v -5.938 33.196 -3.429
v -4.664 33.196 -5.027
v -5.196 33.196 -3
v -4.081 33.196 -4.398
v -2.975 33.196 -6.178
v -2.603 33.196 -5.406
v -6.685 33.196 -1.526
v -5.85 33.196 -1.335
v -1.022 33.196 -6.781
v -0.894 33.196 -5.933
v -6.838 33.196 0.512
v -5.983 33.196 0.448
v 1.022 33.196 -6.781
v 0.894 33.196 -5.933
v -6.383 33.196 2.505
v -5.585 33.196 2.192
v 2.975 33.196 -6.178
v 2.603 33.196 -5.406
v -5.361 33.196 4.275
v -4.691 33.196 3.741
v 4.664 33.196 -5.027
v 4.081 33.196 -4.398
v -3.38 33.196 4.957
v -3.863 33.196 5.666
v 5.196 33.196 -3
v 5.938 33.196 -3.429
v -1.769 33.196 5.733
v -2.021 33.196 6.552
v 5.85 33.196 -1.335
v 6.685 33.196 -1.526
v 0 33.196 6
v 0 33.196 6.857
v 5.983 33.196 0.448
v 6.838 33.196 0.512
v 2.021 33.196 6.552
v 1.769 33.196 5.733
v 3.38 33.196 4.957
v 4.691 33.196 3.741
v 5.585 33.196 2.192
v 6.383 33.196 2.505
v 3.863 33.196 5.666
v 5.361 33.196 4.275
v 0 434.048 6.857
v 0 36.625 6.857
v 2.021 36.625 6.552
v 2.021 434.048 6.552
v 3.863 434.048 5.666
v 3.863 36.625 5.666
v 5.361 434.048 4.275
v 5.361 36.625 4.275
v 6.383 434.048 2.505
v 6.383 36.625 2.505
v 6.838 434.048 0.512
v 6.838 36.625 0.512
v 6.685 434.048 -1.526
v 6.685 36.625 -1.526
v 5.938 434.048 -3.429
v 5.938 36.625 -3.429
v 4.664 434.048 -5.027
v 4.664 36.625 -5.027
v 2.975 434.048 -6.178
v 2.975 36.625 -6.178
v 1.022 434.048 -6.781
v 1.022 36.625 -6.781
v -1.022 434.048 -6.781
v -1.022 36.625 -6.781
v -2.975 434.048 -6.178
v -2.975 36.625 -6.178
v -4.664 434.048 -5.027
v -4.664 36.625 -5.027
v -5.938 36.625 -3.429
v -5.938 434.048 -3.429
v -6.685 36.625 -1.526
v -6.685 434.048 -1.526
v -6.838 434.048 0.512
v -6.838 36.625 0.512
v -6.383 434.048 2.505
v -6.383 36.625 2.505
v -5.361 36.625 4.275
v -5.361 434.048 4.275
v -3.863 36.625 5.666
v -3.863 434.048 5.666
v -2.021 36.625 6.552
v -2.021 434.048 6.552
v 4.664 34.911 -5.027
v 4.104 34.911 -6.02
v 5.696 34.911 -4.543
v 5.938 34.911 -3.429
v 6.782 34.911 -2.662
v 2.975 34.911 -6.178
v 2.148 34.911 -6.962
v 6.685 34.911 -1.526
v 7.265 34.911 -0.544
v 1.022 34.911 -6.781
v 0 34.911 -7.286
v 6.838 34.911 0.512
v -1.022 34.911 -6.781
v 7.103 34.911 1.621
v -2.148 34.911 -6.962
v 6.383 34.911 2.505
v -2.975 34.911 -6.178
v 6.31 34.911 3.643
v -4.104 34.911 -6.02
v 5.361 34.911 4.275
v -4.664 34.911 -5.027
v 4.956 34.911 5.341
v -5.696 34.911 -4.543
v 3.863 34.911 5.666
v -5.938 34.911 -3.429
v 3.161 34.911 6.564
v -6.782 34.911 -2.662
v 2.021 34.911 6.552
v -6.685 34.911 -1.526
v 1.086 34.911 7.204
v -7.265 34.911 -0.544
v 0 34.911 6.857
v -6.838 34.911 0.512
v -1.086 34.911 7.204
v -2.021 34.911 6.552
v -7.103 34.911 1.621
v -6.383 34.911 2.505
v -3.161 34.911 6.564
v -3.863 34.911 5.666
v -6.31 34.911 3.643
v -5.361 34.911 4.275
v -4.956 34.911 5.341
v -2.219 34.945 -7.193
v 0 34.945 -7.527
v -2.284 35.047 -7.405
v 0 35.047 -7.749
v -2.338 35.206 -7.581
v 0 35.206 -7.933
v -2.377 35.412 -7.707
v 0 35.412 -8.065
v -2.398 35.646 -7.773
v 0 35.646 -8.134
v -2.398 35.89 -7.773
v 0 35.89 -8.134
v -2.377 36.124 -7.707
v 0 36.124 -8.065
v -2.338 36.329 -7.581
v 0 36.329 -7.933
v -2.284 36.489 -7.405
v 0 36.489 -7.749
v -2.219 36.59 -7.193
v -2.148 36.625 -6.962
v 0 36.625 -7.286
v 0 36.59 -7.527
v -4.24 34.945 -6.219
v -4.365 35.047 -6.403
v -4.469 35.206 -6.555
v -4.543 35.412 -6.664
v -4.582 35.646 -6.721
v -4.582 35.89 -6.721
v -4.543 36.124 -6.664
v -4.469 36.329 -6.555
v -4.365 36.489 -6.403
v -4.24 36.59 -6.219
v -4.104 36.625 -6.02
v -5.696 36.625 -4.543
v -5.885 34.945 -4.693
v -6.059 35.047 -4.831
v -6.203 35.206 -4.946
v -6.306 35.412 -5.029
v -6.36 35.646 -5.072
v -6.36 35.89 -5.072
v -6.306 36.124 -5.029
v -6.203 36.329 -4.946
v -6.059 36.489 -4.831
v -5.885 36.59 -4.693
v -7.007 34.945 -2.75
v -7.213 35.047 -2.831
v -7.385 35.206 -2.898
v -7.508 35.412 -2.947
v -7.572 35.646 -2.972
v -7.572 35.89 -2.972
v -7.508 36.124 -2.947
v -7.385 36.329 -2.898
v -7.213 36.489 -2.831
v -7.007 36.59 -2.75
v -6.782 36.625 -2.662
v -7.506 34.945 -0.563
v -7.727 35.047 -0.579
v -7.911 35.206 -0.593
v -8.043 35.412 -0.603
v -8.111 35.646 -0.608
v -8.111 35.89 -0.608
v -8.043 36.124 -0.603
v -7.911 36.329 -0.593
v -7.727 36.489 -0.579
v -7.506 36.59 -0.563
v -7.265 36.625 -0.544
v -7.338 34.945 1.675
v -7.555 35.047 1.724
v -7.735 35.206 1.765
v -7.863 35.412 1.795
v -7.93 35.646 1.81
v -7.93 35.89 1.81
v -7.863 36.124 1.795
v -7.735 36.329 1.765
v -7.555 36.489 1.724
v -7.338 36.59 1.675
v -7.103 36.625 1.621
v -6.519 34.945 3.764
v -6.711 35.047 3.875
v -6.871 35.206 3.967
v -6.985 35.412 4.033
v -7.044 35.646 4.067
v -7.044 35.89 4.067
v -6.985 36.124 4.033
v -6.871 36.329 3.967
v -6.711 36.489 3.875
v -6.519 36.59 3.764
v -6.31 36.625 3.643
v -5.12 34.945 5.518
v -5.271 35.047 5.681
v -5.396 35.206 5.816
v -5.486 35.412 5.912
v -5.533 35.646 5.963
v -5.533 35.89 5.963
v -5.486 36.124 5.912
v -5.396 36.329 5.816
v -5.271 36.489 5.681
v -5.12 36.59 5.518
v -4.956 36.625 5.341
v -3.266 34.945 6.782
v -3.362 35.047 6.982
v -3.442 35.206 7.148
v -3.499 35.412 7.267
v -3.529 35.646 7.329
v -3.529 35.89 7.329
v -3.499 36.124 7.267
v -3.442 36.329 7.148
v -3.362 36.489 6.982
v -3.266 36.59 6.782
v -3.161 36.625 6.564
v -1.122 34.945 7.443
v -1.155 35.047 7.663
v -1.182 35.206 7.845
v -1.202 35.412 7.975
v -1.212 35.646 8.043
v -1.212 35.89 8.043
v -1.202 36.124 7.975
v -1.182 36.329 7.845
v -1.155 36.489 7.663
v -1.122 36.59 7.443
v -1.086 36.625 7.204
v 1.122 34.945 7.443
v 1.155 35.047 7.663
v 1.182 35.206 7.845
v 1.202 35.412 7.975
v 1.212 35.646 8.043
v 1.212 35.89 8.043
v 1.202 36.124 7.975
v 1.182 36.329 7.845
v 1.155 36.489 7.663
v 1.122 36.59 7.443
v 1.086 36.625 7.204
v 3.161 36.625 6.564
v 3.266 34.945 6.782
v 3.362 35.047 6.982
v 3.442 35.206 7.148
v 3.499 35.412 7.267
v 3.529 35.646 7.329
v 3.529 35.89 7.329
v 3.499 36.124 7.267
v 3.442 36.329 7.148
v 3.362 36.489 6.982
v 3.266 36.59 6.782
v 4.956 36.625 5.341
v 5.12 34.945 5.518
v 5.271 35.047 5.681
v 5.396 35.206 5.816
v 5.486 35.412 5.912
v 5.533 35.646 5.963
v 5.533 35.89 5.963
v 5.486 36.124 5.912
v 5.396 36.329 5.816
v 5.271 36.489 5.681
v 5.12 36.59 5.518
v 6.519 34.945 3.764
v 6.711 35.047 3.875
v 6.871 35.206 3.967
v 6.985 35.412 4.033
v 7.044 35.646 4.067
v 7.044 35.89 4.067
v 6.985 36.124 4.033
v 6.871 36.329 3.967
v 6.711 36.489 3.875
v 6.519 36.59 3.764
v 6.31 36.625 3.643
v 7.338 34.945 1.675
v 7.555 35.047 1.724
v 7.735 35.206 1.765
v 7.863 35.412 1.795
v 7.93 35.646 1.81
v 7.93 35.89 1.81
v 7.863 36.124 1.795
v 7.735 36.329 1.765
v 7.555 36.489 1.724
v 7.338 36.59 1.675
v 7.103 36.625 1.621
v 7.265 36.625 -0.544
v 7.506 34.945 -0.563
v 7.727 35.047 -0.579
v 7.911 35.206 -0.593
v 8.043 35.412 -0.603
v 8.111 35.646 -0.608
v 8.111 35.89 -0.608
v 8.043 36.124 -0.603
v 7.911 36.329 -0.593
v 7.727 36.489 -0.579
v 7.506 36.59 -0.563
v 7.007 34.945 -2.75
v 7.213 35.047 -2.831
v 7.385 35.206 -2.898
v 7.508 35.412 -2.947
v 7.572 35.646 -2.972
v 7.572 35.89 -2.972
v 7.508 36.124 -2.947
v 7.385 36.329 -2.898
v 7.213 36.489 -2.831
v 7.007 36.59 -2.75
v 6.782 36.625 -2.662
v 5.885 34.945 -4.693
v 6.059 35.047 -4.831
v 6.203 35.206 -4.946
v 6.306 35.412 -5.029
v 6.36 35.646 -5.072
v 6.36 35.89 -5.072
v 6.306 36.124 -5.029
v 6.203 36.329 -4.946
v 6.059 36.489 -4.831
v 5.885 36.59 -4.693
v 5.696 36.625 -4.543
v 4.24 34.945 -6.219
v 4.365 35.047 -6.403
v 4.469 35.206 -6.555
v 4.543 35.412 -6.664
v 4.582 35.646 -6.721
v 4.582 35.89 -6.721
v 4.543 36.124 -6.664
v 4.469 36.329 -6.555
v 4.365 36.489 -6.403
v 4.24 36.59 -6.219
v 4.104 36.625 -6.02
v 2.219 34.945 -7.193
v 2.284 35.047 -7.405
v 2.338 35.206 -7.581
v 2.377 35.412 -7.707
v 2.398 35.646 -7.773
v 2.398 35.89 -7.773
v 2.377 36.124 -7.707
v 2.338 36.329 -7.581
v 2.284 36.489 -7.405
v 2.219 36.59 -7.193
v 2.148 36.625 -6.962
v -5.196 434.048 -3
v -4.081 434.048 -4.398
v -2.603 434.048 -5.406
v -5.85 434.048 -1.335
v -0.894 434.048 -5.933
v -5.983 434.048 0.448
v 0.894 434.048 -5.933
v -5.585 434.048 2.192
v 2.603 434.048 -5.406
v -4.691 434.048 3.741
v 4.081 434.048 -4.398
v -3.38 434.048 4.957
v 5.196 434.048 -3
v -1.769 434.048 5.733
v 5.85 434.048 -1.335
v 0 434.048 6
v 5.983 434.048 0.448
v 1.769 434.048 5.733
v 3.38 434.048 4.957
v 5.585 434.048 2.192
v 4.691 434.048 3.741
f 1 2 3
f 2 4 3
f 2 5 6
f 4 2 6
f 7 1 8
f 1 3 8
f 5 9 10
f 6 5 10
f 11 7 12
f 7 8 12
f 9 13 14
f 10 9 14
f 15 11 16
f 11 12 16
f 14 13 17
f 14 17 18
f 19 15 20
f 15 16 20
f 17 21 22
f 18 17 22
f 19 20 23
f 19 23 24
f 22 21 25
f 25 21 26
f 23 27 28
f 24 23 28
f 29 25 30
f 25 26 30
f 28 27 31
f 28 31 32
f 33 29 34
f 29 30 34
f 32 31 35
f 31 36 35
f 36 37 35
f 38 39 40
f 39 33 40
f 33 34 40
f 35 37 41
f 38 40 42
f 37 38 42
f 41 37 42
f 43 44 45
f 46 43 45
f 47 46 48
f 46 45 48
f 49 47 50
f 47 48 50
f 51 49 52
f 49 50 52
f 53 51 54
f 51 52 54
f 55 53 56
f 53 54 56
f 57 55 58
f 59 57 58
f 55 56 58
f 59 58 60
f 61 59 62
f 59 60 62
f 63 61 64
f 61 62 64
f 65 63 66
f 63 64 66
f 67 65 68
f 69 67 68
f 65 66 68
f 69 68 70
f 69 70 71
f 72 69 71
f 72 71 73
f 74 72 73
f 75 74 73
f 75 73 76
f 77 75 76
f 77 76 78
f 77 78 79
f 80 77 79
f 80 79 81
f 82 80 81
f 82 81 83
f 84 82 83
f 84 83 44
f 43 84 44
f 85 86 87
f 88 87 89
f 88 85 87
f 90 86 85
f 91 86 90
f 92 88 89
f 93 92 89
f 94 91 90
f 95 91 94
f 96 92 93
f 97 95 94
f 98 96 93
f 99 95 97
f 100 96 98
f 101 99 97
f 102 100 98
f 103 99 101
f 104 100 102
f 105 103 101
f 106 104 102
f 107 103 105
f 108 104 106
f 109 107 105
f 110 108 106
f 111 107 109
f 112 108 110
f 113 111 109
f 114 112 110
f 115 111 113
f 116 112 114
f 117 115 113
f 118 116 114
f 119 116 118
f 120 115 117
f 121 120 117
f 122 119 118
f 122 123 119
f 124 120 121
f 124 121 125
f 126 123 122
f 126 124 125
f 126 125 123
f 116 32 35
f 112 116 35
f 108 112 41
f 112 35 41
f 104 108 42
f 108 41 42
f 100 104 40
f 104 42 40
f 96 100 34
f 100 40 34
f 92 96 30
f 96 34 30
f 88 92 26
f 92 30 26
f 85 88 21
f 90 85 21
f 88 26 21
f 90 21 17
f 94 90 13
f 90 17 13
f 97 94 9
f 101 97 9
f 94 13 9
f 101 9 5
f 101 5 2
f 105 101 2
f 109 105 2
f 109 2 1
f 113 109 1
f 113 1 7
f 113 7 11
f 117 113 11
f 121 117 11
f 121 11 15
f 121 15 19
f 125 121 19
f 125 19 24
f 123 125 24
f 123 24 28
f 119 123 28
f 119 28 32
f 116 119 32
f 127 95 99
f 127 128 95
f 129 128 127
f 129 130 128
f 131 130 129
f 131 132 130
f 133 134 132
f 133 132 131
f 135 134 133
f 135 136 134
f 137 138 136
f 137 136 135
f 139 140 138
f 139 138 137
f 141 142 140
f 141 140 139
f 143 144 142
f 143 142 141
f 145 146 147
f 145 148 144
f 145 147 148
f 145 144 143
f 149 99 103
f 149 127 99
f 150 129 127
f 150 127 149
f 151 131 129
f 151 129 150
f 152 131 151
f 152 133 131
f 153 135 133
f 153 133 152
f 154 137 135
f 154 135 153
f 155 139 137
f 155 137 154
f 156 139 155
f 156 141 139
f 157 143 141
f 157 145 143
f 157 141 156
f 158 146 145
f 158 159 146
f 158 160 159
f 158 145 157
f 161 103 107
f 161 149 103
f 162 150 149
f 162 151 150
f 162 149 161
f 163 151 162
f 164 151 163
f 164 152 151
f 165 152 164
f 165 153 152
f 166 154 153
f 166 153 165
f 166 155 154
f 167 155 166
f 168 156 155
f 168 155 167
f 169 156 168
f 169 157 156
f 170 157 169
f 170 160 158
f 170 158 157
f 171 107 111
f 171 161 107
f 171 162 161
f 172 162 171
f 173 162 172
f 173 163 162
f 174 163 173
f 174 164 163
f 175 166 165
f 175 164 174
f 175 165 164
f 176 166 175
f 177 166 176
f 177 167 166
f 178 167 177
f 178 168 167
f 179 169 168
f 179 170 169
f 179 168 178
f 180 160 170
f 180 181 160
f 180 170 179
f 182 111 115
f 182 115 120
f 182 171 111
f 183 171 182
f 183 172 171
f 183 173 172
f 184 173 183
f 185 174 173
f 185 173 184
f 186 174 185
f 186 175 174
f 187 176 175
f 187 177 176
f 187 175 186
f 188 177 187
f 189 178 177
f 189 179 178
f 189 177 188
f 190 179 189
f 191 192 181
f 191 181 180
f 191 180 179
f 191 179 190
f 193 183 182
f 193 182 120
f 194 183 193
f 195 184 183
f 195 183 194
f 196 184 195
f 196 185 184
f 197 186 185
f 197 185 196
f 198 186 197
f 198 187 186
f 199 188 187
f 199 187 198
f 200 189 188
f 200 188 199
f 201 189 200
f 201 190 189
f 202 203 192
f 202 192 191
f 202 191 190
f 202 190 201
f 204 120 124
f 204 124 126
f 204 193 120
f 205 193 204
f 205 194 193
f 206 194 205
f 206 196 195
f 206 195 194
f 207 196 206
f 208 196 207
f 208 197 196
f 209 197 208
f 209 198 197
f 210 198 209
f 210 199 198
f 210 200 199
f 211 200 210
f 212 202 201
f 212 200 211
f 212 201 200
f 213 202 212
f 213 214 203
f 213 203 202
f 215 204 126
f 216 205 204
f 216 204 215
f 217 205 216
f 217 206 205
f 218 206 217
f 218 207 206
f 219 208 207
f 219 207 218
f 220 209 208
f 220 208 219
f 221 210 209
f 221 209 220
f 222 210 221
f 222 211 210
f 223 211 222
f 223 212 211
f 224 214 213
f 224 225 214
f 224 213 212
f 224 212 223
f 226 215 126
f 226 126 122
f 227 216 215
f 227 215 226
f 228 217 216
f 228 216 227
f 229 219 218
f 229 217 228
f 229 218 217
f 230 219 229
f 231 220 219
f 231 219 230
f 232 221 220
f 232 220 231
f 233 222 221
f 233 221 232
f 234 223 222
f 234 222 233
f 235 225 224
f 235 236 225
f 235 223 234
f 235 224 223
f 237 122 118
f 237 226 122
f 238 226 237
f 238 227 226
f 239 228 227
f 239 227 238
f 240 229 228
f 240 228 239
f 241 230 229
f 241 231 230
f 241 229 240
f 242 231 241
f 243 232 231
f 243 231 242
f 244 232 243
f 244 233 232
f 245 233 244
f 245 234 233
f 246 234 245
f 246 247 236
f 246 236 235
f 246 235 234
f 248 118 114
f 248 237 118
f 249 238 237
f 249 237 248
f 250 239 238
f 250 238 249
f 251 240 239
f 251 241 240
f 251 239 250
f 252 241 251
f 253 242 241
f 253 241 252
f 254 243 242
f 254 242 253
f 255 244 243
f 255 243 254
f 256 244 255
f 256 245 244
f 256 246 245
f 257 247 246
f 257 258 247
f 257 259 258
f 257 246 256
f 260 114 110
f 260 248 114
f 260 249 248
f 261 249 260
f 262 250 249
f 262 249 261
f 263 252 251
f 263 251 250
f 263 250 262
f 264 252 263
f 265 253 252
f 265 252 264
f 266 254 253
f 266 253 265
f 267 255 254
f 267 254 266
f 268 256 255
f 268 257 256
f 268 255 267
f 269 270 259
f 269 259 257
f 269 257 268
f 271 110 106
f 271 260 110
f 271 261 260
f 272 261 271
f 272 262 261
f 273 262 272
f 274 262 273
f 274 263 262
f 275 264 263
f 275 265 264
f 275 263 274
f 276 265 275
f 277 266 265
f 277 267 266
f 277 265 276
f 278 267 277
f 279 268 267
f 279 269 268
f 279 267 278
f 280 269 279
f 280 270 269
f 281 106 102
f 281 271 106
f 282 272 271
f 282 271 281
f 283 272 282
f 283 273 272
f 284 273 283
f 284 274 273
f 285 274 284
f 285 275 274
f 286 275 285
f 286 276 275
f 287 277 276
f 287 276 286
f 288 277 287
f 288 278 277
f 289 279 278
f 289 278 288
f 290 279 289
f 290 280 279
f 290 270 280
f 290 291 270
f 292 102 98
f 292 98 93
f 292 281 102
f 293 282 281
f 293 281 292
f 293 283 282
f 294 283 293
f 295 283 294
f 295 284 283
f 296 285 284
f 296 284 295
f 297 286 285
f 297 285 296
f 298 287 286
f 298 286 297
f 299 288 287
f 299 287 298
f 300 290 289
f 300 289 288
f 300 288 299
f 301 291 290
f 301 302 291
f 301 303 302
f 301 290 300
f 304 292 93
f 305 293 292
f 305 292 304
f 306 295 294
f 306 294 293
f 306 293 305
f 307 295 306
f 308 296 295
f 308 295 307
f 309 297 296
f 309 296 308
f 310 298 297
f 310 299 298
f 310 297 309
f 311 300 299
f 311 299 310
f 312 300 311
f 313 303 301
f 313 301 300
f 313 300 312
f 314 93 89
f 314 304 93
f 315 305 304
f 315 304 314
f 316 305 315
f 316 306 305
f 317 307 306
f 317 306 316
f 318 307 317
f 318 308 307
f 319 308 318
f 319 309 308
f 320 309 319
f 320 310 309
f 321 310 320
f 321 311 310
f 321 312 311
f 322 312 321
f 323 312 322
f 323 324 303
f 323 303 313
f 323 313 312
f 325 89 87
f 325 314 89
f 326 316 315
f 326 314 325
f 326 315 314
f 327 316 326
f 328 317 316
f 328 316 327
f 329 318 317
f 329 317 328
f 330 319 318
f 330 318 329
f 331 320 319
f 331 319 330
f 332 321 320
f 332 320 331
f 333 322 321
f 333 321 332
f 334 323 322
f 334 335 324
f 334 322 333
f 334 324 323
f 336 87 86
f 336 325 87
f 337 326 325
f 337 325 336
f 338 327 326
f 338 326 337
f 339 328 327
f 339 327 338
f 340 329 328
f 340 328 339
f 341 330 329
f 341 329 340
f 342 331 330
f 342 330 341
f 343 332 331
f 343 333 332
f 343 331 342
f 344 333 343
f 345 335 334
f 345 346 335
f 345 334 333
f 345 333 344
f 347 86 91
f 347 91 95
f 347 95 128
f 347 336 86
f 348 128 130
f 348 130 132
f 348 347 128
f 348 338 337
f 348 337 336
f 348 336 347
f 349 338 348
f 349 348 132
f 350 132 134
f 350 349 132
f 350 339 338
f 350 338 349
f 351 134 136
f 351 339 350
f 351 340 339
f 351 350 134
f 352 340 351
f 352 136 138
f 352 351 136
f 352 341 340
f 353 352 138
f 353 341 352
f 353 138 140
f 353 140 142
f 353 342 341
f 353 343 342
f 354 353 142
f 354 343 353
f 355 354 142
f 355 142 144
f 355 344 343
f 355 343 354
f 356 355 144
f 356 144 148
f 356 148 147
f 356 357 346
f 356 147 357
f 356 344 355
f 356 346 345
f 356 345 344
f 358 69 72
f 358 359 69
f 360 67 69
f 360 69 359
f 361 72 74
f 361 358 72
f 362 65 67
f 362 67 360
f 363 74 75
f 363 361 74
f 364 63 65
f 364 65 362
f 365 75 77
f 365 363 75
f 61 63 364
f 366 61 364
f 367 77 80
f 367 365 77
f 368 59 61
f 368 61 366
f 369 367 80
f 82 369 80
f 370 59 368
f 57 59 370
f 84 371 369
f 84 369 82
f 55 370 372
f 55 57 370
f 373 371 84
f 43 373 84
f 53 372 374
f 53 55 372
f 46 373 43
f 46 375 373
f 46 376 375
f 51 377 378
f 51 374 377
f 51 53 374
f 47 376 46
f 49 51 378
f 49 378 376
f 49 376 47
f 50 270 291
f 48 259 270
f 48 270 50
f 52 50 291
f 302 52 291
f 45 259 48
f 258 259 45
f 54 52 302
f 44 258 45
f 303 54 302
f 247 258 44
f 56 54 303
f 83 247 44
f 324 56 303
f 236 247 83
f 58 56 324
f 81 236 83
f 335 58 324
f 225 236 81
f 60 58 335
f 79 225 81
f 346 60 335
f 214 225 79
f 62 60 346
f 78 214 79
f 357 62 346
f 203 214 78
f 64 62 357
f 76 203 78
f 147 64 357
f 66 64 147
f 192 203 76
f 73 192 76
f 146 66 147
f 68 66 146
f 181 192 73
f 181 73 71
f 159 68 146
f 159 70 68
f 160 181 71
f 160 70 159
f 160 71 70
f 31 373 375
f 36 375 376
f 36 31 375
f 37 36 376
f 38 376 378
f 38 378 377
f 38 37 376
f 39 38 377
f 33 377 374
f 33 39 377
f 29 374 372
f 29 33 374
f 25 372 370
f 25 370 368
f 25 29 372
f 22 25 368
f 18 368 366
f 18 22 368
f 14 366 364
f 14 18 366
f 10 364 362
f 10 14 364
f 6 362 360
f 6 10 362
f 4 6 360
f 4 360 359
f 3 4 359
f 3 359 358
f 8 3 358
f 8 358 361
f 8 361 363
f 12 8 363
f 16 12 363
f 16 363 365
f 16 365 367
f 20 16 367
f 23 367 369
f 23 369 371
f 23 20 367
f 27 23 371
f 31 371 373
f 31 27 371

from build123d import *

# Parameters (mm, degrees)
SKETCH1_R           = 8
SKETCH1_R_2         = 7
BOSS_EXTRUDE1_DEPTH = 467.66
SCALE1_SCALE        = 0.857142857


with BuildPart() as part:
    # Sketch1 → Boss-Extrude1 (new body)
    with BuildSketch(Plane(origin=(0, 0, 0), x_dir=(1, 0, 0), z_dir=(0, 1, 0))):
        with Locations(Location((0, 0, 0), (0, 0, 270))):
            Circle(SKETCH1_R)
        with Locations(Location((0, 0, 0), (0, 0, 270))):
            Circle(SKETCH1_R_2, mode=Mode.SUBTRACT)
    extrude(amount=BOSS_EXTRUDE1_DEPTH)

    # Sketch2 → Revolve1 (revolve)
    with BuildSketch(Plane.XY, mode=Mode.PRIVATE) as revolve1_sk:
        with BuildLine():
            Line((8, 2), (8.5, 2))
            ThreePointArc((8.5, 2), (9.5, 3), (8.5, 4))
            Line((8.5, 4), (8, 4))
            Line((8, 4), (8, 2))
        make_face()
    revolve(revolve1_sk.sketch.rotate(Axis((0, 0, 0), (0, 1, 0)), 90), axis=Axis((0, 0, 0), (0, 1, 0)))


with BuildPart() as part_1:
    # Scale1: scaled about (0, 232.373730032, 0)
    add(part.part.scale(SCALE1_SCALE).moved(Location((0, 33.196247147, 0))))


solid = part_1.part
